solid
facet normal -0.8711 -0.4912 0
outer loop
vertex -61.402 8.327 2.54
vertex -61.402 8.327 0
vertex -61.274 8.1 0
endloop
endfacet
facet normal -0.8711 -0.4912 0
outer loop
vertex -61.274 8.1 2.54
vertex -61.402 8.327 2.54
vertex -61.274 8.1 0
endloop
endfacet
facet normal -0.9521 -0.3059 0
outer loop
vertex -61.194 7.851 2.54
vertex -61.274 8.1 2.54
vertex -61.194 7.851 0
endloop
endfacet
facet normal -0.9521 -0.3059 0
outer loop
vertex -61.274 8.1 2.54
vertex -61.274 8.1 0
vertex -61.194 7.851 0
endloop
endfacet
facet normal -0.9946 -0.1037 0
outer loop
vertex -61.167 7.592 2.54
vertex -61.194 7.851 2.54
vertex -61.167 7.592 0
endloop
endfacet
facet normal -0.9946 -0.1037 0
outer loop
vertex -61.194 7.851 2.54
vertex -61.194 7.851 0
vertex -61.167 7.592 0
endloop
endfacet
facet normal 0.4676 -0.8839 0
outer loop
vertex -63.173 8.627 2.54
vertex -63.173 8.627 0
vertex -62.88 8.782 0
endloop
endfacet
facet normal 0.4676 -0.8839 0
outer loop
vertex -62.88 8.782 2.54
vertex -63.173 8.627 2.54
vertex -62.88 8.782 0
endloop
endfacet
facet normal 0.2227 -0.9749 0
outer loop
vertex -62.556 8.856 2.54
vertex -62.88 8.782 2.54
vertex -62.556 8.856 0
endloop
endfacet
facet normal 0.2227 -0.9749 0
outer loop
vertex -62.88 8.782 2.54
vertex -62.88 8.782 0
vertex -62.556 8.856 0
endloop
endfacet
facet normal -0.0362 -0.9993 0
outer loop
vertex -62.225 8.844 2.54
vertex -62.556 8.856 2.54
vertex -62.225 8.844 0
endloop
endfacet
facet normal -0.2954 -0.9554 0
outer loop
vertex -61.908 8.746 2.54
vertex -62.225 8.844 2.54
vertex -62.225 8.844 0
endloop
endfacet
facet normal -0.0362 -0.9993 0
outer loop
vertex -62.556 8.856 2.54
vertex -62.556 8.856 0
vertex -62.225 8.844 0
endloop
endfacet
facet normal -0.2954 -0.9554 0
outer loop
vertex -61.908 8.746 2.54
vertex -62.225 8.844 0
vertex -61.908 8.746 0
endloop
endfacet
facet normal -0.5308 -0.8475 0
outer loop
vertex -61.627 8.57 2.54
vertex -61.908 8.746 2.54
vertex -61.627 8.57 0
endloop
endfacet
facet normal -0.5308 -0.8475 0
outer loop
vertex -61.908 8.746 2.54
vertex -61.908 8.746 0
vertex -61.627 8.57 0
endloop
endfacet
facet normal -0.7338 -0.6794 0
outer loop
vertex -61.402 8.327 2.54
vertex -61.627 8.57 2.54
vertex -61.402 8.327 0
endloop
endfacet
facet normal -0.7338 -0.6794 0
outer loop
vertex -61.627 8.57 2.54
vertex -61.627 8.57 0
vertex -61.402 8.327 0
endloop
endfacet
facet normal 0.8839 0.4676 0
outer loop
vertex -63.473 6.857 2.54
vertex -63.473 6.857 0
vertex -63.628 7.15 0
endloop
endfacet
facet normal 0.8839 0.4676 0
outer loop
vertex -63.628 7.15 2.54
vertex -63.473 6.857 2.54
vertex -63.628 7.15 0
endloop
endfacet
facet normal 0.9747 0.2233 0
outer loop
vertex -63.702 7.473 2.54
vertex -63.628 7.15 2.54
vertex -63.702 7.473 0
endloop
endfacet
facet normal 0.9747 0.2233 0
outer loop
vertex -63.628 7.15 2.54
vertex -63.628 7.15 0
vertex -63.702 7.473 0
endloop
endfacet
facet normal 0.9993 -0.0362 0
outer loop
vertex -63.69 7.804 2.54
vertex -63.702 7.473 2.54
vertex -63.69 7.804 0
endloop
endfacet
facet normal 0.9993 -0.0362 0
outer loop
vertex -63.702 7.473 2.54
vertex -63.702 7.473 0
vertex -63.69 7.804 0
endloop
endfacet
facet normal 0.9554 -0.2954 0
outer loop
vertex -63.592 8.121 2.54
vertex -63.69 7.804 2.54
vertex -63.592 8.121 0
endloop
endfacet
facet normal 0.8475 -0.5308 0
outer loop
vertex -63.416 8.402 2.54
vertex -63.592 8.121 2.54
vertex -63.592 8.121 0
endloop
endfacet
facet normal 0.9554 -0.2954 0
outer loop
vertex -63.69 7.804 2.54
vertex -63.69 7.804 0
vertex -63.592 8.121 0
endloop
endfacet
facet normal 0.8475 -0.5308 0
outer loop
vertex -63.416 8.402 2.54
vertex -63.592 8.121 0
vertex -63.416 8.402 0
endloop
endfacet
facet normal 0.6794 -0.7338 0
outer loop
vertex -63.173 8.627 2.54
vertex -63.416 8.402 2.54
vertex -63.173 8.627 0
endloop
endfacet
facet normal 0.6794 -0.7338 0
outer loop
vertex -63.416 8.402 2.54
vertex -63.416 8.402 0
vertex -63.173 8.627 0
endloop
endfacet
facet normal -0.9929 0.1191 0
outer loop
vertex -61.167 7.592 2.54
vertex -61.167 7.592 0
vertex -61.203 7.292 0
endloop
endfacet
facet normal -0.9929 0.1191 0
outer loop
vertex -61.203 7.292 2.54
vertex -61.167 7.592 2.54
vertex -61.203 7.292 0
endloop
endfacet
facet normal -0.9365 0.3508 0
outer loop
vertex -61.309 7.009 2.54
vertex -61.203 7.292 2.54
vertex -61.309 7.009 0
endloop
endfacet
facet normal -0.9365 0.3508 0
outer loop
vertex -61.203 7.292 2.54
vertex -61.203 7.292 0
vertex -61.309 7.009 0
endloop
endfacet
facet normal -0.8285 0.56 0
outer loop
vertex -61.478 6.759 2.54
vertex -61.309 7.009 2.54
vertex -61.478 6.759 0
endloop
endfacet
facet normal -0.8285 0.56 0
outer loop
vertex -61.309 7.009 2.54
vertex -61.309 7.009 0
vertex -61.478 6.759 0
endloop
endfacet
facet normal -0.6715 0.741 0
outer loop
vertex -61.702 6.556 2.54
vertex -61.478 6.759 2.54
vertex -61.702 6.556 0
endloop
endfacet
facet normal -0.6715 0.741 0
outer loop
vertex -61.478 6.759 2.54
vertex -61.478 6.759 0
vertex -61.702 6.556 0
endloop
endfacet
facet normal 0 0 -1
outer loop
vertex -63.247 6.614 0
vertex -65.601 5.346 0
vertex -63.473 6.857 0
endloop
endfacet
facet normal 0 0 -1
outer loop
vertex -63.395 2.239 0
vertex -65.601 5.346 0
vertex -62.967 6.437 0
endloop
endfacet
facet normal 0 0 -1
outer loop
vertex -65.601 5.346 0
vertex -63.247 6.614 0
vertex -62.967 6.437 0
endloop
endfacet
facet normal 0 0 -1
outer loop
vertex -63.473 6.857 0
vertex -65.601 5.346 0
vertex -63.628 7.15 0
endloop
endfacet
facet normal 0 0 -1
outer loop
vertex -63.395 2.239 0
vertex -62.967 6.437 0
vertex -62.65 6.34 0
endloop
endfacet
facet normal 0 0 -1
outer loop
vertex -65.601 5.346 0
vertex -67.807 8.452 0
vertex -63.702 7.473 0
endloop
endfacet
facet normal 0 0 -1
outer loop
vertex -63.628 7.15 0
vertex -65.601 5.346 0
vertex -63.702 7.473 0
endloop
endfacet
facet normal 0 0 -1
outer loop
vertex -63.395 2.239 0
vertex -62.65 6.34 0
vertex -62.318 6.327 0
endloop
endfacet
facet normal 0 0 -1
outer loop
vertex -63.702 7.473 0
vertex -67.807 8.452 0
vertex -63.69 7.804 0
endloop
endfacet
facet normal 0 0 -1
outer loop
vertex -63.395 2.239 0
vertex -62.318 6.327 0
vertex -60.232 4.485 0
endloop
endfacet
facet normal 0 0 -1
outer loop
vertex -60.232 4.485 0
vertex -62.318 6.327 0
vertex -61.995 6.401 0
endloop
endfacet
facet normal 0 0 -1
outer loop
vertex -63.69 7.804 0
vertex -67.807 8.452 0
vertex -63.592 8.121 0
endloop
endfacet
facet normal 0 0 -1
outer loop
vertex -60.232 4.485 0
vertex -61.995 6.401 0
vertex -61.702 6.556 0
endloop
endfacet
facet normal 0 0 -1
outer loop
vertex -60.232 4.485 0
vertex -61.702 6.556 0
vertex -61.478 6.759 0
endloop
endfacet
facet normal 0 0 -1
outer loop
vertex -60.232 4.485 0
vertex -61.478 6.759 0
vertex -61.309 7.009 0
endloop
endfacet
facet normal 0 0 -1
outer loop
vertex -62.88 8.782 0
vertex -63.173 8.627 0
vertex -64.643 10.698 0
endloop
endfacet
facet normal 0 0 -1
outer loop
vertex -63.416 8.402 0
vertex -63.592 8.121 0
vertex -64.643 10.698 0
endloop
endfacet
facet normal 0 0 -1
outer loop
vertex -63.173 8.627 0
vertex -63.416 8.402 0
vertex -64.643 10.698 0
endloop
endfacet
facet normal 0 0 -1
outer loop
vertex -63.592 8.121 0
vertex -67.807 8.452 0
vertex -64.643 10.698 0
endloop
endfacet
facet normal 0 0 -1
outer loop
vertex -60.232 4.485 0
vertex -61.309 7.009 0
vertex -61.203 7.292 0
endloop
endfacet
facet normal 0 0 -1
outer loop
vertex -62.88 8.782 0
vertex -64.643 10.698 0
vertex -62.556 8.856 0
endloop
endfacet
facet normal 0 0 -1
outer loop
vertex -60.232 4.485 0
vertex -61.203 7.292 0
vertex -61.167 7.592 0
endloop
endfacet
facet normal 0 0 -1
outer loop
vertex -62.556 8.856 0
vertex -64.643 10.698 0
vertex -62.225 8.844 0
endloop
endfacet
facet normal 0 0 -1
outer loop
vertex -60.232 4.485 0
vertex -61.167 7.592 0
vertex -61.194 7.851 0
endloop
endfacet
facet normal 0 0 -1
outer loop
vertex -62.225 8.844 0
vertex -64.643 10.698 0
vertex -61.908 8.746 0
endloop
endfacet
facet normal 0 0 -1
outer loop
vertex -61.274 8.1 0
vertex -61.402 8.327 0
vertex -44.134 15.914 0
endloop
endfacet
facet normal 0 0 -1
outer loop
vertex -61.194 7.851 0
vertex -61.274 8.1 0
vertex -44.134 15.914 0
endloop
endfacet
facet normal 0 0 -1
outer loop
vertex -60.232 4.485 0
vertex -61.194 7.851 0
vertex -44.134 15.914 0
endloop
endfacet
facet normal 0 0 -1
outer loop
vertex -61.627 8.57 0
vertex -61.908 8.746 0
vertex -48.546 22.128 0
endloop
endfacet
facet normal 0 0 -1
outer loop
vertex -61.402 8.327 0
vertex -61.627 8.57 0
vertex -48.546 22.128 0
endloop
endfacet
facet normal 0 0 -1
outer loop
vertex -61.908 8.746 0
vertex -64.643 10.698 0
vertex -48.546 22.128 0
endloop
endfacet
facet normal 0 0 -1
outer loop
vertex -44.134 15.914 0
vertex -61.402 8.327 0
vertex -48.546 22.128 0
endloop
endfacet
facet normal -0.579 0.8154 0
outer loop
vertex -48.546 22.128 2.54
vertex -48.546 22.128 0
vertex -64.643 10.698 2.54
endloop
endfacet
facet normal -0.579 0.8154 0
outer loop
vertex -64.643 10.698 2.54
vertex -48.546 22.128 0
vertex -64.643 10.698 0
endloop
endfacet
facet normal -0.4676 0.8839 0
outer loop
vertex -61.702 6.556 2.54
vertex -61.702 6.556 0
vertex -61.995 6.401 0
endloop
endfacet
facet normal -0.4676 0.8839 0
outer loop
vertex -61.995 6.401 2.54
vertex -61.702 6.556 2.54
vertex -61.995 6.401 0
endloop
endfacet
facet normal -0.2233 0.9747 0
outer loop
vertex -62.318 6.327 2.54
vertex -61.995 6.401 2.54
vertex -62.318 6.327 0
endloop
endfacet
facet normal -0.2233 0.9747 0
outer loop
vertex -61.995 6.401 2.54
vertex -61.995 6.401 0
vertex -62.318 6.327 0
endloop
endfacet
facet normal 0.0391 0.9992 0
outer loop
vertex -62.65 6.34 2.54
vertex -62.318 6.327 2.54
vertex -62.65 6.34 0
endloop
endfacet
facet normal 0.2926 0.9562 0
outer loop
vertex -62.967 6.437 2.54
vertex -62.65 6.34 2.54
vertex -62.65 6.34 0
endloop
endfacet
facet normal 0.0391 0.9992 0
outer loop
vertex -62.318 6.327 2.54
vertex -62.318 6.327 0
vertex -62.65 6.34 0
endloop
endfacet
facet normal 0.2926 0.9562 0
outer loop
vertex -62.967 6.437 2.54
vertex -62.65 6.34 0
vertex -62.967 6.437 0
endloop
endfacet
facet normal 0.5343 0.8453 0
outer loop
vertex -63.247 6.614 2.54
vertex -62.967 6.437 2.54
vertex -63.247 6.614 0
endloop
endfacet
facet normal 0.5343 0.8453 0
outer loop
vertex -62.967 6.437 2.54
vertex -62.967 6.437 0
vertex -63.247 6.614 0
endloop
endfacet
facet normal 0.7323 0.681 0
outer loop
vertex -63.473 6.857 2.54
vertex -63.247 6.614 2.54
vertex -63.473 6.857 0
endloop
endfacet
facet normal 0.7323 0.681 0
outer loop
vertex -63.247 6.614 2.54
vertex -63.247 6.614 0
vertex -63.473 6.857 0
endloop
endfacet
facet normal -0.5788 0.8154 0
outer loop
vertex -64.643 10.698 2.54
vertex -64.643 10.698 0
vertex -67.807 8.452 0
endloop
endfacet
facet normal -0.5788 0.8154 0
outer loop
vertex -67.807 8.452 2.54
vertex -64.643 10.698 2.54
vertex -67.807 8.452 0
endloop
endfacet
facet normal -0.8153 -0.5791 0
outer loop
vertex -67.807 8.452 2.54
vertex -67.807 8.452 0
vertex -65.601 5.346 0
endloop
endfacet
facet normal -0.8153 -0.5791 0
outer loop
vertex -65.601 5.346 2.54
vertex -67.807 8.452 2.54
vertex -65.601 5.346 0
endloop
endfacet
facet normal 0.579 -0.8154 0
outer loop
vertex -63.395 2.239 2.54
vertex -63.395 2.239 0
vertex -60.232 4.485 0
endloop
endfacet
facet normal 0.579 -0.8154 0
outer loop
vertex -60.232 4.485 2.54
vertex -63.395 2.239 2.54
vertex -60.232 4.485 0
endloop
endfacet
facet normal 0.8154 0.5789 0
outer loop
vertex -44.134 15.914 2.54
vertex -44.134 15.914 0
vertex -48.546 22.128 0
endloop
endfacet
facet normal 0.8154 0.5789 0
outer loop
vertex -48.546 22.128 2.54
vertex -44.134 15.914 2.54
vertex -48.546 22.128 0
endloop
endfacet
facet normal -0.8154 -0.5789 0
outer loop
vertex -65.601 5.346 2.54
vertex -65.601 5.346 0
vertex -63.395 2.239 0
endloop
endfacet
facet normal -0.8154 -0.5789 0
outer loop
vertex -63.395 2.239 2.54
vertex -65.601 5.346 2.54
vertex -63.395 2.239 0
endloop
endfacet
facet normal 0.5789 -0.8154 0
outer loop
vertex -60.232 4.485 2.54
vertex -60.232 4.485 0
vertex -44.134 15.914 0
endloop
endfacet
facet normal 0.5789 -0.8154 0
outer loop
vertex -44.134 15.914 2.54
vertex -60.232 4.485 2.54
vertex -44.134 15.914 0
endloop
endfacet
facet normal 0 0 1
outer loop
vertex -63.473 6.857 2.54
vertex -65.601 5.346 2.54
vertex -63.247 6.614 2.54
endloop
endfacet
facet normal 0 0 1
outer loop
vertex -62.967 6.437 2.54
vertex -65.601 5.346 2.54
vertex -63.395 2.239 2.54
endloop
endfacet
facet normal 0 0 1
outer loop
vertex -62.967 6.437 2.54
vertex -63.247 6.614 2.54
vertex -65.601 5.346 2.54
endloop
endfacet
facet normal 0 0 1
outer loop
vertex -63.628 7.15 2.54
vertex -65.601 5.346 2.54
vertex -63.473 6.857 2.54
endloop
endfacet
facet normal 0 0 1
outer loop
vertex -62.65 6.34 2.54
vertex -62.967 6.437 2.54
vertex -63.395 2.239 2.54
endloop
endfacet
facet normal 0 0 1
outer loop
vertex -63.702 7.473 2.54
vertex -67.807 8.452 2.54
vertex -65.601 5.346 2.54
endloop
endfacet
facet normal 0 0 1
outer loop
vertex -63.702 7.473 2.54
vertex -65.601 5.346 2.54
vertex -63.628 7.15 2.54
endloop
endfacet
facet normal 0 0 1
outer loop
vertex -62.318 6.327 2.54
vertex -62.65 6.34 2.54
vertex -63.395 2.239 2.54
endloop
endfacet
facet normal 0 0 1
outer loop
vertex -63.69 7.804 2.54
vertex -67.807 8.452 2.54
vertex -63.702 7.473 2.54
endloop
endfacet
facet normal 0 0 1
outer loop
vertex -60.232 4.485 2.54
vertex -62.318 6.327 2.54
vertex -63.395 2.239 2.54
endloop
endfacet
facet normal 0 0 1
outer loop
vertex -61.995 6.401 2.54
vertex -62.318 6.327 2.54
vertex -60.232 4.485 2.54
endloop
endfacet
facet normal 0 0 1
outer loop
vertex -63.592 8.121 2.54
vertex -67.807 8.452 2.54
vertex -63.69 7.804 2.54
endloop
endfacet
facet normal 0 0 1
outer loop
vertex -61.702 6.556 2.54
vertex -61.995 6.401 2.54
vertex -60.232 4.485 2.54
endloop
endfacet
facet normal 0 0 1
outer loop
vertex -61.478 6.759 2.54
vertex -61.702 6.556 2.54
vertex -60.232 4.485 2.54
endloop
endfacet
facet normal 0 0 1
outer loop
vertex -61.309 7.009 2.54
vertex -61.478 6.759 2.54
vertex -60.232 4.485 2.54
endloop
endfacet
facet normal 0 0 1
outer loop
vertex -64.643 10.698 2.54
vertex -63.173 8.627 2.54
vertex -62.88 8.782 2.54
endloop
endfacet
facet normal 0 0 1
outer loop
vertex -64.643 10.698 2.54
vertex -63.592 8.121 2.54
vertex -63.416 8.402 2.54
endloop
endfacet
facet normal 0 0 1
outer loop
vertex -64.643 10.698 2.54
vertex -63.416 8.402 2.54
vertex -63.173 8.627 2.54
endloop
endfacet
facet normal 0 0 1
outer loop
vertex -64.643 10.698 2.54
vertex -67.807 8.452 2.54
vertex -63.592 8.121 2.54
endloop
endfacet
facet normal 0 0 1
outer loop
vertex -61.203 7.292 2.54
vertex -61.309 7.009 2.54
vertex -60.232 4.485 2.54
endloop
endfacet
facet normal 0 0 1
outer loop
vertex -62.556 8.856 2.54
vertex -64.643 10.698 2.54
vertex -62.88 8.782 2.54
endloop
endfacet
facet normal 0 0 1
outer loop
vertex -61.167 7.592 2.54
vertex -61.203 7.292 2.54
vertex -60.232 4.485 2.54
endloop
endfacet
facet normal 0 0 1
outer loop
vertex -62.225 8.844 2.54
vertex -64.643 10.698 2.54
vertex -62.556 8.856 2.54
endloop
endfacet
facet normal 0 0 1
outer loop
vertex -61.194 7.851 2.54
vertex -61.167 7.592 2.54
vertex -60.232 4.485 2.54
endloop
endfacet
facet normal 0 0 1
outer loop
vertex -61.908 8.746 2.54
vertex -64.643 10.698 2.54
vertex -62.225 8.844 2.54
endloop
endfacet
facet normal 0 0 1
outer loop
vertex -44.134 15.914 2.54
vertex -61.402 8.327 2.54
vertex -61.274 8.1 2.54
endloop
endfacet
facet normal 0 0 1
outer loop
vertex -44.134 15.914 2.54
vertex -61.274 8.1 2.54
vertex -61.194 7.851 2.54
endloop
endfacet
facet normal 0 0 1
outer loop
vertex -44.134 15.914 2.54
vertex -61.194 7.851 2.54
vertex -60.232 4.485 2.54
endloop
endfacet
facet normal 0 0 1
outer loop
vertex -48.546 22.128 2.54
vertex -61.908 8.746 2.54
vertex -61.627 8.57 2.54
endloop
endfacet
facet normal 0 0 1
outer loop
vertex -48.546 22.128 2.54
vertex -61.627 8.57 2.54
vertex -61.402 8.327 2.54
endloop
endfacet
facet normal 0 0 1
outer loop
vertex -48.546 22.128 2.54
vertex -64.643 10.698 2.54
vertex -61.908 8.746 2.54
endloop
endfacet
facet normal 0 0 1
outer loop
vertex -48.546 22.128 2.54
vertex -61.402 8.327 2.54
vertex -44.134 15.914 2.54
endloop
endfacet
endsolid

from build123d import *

# Parameters (mm, degrees)
BOSS_EXTRUDE2_DEPTH = 2.54


with BuildPart() as part:
    # Sketch1 → Boss-Extrude2 (new body)
    with BuildSketch(Plane.XY):
        with BuildLine():
            Line((-48.545691329, 22.127640633), (-64.643124973, 10.698462746))
            Line((-64.643124973, 10.698462746), (-63.172663299, 8.627389965))
            ThreePointArc((-63.172663299, 8.627389965), (-62.225084369, 8.843975089), (-61.401896071, 8.327084411))
            Line((-61.401896071, 8.327084411), (-46.339998817, 19.021031462))
            Line((-46.339998817, 19.021031462), (-48.545691329, 22.127640633))
        make_face()
        with BuildLine():
            Line((-44.134306305, 15.914422291), (-46.339998817, 19.021031462))
            Line((-46.339998817, 19.021031462), (-61.401896071, 8.327084411))
            ThreePointArc((-61.401896071, 8.327084411), (-61.227467335, 7.977708977), (-61.167432462, 7.591853574))
            ThreePointArc((-61.167432462, 7.591853574), (-61.309016943, 7.00912), (-61.702201624, 6.556317184))
            Line((-61.702201624, 6.556317184), (-60.23173995, 4.485244403))
            Line((-60.23173995, 4.485244403), (-44.134306305, 15.914422291))
        make_face()
        with BuildLine():
            Line((-63.472968852, 6.856622737), (-65.60097568, 5.345737889))
            Line((-65.60097568, 5.345737889), (-63.395283168, 2.239128718))
            Line((-63.395283168, 2.239128718), (-60.23173995, 4.485244403))
            Line((-60.23173995, 4.485244403), (-61.702201624, 6.556317184))
            ThreePointArc((-61.702201624, 6.556317184), (-62.649780555, 6.33973206), (-63.472968852, 6.856622737))
        make_face()
        with BuildLine():
            Line((-64.643124973, 10.698462746), (-67.806668191, 8.452347061))
            Line((-67.806668191, 8.452347061), (-65.60097568, 5.345737889))
            Line((-65.60097568, 5.345737889), (-63.472968852, 6.856622737))
            ThreePointArc((-63.472968852, 6.856622737), (-63.689553976, 7.804201667), (-63.172663299, 8.627389965))
            Line((-63.172663299, 8.627389965), (-64.643124973, 10.698462746))
        make_face()
    extrude(amount=BOSS_EXTRUDE2_DEPTH)


solid = part.part
